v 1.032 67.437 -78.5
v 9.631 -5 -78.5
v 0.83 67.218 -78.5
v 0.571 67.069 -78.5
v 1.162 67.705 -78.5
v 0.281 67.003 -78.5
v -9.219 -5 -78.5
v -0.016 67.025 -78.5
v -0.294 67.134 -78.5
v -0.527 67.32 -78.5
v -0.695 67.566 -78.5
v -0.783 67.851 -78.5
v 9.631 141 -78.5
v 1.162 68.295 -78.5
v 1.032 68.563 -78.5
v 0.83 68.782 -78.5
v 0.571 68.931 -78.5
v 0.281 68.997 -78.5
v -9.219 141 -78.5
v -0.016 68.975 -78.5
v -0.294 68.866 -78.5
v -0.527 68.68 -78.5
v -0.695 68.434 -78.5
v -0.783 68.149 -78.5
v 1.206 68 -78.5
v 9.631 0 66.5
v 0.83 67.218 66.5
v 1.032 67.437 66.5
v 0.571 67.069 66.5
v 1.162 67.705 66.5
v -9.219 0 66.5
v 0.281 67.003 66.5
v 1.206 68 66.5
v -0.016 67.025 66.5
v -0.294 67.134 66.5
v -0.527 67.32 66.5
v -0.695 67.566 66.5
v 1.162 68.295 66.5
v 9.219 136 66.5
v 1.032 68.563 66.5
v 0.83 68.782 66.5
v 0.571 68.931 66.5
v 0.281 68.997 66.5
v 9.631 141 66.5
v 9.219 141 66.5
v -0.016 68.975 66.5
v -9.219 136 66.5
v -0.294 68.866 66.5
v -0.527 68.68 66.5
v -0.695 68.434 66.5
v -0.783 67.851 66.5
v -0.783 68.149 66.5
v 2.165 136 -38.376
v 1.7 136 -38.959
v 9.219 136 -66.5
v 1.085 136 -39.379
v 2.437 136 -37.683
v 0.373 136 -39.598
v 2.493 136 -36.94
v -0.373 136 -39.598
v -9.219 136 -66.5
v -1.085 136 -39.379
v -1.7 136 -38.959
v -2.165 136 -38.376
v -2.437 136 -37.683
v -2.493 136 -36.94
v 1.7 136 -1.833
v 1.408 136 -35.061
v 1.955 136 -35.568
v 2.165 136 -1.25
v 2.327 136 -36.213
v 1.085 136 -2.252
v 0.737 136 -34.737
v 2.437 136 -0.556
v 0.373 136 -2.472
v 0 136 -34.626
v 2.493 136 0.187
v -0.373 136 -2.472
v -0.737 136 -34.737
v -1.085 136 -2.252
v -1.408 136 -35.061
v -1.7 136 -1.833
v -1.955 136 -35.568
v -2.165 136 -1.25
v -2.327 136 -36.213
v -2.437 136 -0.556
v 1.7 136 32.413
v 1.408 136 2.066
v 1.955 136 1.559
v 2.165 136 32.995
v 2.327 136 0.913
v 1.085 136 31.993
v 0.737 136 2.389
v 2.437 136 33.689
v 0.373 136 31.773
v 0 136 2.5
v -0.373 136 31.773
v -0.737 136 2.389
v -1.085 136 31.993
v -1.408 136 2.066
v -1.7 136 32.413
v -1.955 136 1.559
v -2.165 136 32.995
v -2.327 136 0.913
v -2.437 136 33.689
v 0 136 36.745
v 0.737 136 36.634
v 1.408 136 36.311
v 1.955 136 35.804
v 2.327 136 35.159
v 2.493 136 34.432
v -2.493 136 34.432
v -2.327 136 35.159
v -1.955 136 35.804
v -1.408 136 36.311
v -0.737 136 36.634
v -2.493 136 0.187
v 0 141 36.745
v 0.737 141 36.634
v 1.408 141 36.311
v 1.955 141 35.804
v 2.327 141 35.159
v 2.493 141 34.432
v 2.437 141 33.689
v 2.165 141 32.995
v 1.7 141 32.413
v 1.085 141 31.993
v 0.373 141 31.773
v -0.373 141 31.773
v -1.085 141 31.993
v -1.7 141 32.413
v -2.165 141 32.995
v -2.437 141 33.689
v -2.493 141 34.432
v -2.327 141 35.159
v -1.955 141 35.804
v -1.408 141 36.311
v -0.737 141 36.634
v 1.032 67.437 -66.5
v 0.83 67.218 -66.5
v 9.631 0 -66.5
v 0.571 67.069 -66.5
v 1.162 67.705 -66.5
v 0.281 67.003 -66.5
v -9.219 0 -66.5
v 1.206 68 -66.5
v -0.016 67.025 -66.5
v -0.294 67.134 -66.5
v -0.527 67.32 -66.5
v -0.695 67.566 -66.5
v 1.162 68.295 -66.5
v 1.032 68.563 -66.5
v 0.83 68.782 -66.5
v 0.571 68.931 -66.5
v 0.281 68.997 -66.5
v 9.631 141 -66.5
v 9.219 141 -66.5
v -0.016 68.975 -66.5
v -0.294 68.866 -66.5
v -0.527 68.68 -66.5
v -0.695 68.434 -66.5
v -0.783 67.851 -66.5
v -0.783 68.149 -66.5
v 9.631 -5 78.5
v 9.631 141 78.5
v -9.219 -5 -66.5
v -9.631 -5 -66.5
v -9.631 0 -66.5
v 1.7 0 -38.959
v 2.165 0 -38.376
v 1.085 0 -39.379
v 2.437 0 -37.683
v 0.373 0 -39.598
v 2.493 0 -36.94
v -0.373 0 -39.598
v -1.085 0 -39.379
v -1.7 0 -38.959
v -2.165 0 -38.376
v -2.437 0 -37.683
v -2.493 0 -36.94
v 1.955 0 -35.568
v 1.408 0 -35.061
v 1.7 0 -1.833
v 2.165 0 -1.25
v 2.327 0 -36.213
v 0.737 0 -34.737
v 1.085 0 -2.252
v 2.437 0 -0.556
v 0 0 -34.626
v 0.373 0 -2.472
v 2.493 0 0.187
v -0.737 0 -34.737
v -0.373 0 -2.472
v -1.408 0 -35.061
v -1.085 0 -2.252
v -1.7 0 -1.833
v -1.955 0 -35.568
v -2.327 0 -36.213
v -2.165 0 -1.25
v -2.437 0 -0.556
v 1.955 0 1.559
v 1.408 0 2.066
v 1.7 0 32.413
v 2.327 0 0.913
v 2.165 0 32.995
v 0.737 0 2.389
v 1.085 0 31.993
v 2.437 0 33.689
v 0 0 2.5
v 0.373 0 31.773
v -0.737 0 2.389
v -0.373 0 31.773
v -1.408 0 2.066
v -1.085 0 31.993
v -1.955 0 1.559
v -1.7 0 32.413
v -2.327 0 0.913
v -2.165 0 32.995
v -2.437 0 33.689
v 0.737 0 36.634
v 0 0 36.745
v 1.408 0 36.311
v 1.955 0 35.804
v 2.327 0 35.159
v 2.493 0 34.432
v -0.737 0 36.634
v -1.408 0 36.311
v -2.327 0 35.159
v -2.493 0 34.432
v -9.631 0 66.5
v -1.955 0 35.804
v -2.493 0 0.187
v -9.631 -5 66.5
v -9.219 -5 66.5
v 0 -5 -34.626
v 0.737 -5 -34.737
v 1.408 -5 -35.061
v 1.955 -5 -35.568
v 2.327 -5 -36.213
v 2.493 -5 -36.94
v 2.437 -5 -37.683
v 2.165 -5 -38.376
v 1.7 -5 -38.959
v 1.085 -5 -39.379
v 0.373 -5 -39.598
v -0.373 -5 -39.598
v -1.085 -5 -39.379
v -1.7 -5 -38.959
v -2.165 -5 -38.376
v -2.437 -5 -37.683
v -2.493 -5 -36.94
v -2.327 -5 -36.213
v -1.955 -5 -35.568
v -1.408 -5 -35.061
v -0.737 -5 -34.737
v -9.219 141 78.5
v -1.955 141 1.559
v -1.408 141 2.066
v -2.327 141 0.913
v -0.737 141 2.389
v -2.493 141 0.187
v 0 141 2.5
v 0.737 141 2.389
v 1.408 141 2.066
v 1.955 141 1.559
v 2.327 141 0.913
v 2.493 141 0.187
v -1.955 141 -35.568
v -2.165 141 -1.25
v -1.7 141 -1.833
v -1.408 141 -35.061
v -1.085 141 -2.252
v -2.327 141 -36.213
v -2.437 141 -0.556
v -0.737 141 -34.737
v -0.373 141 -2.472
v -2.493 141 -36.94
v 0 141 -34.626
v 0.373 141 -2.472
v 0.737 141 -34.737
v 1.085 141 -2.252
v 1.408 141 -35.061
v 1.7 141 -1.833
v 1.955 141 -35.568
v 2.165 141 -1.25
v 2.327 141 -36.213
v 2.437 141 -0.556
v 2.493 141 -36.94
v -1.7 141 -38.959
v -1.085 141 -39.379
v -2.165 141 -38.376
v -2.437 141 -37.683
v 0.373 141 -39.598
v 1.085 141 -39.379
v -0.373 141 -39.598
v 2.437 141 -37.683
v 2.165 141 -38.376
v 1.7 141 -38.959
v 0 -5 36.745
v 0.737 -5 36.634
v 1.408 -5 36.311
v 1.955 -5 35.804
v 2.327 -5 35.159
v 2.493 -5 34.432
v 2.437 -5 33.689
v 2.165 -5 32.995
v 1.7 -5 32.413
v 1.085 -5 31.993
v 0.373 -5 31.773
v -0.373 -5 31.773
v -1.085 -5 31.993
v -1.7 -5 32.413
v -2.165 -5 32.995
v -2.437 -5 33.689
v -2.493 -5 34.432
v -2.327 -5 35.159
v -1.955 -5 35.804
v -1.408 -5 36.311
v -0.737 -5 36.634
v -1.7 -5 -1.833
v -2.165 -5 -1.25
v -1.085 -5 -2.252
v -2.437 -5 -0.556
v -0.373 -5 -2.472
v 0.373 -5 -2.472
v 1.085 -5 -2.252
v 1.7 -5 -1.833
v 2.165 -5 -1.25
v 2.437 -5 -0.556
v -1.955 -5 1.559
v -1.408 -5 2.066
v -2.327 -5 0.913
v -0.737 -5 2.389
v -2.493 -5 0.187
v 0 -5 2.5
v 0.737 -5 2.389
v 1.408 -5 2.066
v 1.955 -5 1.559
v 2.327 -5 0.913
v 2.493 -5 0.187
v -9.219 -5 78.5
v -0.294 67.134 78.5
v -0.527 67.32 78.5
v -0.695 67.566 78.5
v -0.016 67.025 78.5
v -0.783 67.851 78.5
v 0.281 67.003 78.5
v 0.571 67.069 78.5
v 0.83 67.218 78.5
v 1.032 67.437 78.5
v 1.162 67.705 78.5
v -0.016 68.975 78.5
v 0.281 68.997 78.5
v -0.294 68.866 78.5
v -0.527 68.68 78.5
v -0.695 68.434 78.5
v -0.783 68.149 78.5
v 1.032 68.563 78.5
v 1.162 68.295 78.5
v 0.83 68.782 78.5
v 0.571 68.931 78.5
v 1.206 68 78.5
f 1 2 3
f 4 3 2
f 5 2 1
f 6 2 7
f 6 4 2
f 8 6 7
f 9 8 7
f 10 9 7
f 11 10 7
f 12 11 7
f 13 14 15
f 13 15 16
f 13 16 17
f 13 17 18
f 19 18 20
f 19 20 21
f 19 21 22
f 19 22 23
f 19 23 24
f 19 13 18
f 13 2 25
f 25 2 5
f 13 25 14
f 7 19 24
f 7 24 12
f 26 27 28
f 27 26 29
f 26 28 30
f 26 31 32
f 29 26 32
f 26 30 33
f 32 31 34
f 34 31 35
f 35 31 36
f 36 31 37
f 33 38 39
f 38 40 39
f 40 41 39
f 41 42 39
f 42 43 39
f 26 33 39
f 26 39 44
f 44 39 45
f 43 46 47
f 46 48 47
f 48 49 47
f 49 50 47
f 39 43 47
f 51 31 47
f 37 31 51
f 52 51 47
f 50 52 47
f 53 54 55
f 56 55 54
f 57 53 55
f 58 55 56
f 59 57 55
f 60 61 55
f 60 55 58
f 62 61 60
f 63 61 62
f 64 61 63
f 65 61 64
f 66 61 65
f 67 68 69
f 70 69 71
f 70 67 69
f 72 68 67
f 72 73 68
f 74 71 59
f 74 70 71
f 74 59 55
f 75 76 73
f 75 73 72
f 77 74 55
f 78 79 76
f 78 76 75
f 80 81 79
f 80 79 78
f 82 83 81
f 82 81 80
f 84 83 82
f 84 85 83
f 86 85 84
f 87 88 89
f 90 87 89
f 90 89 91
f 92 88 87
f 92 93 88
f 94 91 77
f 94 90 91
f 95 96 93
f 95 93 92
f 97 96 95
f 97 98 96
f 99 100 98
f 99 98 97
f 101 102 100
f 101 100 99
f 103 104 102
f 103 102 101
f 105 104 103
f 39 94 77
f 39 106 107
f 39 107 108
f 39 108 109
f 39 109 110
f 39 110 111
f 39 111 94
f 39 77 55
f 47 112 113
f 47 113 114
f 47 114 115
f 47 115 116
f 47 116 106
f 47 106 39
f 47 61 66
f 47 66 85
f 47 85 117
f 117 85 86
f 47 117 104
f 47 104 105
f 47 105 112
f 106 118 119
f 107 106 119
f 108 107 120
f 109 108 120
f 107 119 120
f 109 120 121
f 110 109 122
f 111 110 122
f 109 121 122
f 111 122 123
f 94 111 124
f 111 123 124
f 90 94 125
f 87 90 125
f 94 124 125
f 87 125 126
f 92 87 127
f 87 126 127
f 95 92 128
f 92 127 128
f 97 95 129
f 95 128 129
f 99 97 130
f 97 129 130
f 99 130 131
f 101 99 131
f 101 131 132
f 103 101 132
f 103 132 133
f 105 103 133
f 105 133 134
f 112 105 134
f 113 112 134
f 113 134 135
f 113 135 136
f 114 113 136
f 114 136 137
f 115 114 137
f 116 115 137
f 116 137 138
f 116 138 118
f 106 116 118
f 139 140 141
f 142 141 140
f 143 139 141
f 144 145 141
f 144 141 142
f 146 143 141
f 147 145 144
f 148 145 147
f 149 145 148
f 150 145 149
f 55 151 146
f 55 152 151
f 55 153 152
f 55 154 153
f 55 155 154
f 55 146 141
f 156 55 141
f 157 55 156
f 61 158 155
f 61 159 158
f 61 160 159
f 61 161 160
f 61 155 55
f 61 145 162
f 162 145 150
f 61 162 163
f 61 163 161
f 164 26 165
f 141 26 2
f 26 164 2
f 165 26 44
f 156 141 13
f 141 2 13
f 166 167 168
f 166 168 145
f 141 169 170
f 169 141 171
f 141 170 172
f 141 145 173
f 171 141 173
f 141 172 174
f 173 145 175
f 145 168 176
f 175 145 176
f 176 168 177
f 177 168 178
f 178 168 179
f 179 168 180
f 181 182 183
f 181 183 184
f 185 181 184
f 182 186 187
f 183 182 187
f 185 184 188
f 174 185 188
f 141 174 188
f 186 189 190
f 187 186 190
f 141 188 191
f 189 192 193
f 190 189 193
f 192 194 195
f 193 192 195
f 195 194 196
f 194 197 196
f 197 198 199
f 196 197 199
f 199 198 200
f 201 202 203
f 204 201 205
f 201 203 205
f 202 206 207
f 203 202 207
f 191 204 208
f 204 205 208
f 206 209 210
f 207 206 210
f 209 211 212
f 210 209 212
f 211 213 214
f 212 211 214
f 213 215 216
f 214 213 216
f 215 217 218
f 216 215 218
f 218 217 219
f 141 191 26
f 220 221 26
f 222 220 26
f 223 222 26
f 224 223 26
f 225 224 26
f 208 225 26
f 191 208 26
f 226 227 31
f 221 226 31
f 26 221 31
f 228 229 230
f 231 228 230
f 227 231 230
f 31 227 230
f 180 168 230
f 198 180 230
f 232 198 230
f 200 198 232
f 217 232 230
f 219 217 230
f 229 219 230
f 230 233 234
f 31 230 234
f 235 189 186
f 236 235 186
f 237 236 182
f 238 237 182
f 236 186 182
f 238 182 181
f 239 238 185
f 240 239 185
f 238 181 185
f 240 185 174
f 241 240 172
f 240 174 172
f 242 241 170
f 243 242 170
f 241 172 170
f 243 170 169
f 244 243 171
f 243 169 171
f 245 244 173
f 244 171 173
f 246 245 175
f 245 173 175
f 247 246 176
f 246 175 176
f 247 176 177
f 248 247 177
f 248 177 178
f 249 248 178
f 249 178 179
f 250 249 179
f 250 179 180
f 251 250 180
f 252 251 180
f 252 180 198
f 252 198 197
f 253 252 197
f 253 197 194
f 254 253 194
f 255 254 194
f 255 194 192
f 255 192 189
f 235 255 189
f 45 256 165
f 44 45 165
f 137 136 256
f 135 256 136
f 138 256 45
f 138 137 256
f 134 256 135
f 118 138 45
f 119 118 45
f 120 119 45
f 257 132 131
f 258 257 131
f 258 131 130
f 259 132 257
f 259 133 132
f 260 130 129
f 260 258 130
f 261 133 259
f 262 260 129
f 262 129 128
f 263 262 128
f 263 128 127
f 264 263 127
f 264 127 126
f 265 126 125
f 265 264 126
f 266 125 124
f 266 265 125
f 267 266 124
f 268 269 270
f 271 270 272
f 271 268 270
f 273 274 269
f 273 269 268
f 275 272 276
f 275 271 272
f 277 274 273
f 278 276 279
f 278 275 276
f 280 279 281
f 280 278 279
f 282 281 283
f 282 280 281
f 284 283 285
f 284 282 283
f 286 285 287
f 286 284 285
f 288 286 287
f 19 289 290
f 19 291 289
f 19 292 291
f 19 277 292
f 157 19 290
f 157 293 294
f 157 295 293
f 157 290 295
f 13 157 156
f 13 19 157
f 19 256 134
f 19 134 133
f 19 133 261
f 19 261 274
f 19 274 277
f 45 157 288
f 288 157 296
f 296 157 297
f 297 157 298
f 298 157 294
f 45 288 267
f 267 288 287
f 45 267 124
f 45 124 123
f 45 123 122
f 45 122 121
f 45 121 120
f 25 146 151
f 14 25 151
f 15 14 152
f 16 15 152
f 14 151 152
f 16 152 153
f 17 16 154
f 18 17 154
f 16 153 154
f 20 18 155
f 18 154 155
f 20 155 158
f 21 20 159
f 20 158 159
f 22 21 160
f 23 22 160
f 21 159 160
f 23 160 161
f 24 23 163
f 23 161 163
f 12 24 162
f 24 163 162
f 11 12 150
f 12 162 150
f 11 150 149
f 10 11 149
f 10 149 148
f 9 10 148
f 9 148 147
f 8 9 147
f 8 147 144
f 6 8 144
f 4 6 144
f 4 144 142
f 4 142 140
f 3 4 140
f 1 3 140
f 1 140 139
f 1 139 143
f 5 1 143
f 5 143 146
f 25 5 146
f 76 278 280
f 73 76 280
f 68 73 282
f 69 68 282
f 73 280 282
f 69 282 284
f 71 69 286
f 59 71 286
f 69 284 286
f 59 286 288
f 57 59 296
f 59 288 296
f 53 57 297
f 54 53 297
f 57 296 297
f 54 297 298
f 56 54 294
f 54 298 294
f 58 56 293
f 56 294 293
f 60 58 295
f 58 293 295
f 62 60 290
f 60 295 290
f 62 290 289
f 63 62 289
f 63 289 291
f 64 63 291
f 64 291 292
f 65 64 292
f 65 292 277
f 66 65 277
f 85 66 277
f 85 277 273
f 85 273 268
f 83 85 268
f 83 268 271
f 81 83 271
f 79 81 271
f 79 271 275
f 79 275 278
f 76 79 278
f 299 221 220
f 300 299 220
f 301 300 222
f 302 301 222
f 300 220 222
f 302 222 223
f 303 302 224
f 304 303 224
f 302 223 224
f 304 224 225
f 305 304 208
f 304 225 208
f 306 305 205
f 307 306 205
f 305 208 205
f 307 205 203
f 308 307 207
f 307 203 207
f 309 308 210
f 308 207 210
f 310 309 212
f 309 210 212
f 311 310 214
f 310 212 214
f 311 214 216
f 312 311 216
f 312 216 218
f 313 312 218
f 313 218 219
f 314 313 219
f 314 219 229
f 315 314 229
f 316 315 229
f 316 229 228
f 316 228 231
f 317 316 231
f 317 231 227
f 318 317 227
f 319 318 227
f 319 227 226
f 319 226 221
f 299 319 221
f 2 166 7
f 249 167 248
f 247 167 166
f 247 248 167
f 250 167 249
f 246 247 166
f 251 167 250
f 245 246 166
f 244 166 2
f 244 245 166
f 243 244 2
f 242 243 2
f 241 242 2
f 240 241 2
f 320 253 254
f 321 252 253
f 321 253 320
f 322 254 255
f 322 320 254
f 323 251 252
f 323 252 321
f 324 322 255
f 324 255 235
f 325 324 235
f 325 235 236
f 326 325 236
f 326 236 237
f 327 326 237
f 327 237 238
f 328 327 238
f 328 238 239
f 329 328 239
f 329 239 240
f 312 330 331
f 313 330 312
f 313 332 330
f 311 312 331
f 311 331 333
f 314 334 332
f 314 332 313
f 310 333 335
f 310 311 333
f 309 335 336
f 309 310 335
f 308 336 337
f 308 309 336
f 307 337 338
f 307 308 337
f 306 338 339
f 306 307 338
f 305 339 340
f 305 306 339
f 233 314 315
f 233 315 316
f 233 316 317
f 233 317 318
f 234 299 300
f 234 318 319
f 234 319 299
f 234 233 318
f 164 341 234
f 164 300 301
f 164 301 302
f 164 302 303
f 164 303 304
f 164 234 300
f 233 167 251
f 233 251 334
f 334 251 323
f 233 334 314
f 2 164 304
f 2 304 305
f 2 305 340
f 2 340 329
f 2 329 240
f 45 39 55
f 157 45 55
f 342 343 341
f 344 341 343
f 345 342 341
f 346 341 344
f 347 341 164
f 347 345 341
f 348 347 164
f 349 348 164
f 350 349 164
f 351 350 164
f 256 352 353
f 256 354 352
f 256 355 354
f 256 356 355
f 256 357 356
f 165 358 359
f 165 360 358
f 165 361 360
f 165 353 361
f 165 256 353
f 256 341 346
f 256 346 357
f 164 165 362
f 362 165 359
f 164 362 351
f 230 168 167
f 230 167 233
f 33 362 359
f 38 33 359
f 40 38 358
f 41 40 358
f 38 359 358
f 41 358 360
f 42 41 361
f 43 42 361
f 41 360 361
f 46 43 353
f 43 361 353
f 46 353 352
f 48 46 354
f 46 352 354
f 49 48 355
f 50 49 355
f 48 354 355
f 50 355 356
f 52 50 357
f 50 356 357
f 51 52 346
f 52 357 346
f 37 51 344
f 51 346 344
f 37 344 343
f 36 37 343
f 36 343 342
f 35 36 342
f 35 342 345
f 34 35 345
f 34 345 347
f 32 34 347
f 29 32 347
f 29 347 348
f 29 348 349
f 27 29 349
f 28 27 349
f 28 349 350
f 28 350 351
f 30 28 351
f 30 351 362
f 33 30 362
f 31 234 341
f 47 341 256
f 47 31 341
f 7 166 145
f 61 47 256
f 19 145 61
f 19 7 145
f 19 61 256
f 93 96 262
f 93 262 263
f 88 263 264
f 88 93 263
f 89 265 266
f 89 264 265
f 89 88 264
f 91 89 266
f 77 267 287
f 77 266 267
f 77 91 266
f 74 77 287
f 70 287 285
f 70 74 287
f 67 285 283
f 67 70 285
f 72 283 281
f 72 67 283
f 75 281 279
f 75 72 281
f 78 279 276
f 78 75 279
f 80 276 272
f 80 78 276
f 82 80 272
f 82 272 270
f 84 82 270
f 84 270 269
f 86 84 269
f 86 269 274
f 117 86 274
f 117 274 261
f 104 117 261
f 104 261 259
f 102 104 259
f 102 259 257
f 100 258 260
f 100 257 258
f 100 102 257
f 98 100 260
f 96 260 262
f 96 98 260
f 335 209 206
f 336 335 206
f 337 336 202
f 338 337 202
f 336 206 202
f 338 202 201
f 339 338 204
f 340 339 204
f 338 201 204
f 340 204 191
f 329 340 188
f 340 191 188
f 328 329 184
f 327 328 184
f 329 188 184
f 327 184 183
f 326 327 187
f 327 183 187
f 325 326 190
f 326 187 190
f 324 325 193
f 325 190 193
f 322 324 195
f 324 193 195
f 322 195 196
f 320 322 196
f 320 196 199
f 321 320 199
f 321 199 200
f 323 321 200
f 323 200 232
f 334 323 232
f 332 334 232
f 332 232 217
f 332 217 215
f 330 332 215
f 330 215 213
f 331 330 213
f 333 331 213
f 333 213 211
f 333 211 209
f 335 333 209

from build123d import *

# Parameters (mm, degrees)
SKETCH1_W            = 133
SKETCH1_H            = 133
BOSS_EXTRUDE2_DEPTH  = 136
SKETCH2_W            = 133
SKETCH2_H            = 118
CUT_EXTRUDE1_DEPTH   = 136
BOSS_EXTRUDE3_DEPTH  = 10.5
SKETCH5_W            = 21
SKETCH5_H            = 3
BOSS_EXTRUDE4_DEPTH  = 23.5
SKETCH6_W            = 42
SKETCH6_H            = 17.2
CUT_EXTRUDE2_DEPTH   = 3
BOSS_EXTRUDE5_DEPTH  = 10.5
SKETCH8_W            = 21
SKETCH8_H            = 3
BOSS_EXTRUDE6_DEPTH  = 23.5
SKETCH9_W            = 42
SKETCH9_H            = 17.2
CUT_EXTRUDE3_DEPTH   = 3
SKETCH10_W           = 19.261488562
SKETCH10_H           = 133
BOSS_EXTRUDE7_DEPTH  = 5
SKETCH11_W           = 18.43727499
SKETCH11_H           = 133
BOSS_EXTRUDE8_DEPTH  = 5
SKETCH12_W           = 18.849381776
SKETCH12_H           = 146
BOSS_EXTRUDE9_DEPTH  = 12
SKETCH14_W           = 18.849381776
SKETCH14_H           = 146
BOSS_EXTRUDE10_DEPTH = 12
SKETCH17_R           = 1
CUT_EXTRUDE4_DEPTH   = 222.251553667
SKETCH18_W           = 133
SKETCH18_H           = 136
CUT_EXTRUDE5_DEPTH   = 170
SKETCH20_R           = 2.5
CUT_EXTRUDE6_DEPTH   = 10
SKETCH22_R           = 2.5
CUT_EXTRUDE8_DEPTH   = 170
SKETCH24_R           = 2.5
CUT_EXTRUDE9_DEPTH   = 170
SKETCH26_R           = 2.474722671
CUT_EXTRUDE10_DEPTH  = 177
SKETCH27_R           = 2.5
CUT_EXTRUDE11_DEPTH  = 177
SKETCH29_R           = 2.5
CUT_EXTRUDE12_DEPTH  = 177
SKETCH30_R           = 2.5
CUT_EXTRUDE13_DEPTH  = 178
SKETCH31_R           = 2.5
CUT_EXTRUDE14_DEPTH  = 178
SKETCH32_R           = 2.474722671
SKETCH32_R_2         = 2.5
BOSS_EXTRUDE11_DEPTH = 5
SKETCH33_R           = 2.5
BOSS_EXTRUDE12_DEPTH = 5


with BuildPart() as part:
    # Sketch1 → Boss-Extrude2 (new body)
    with BuildSketch(Plane(origin=(0, 0, 0), x_dir=(1, 0, 0), z_dir=(0, 1, 0))):
        Rectangle(SKETCH1_W, SKETCH1_H)
    extrude(amount=BOSS_EXTRUDE2_DEPTH)

    # Sketch2 → Cut-Extrude1 (cut)
    with BuildSketch(Plane.XY.offset(66.5)):
        with Locations((0, 68)):
            Rectangle(SKETCH2_W, SKETCH2_H)
    extrude(amount=-CUT_EXTRUDE1_DEPTH, mode=Mode.SUBTRACT)


with BuildPart() as cut_extrude1_piece_1:
    # of the separate pieces the step leaves, piece 1, a body of its own (cut_extrude1_pieces)
    add(part.part.solids().sort_by_distance((-66.5, 0, 66.5))[0])

    # Sketch4 → Boss-Extrude3 (add)
    with BuildSketch(Plane(origin=(0, 9, 0), x_dir=(1, 0, 0), z_dir=(0, 1, 0))):
        Polygon((22.75, -22.75), (43.75, -22.75), (46.25, -22.75), (46.25, -20.25), (20.25, -20.25), (20.25, -46.25), (46.25, -46.25), (46.25, -43.75), (43.75, -43.75), (22.75, -43.75), align=None)
        Polygon((22.75, 43.75), (43.75, 43.75), (46.25, 43.75), (46.25, 46.25), (20.25, 46.25), (20.25, 20.25), (46.25, 20.25), (46.25, 22.75), (43.75, 22.75), (22.75, 22.75), align=None)
    extrude(amount=BOSS_EXTRUDE3_DEPTH)

    # Sketch5 → Boss-Extrude4 (add)
    with BuildSketch(Plane(origin=(22.75, 0, 0), x_dir=(0, 0, -1), z_dir=(1, 0, 0))):
        with Locations((-33.25, 18)):
            Rectangle(SKETCH5_W, SKETCH5_H)
        with Locations((33.25, 18)):
            Rectangle(SKETCH5_W, SKETCH5_H)
    extrude(amount=BOSS_EXTRUDE4_DEPTH)

    # Sketch6 → Cut-Extrude2 (cut)
    with BuildSketch(Plane(origin=(0, 19.5, 0), x_dir=(1, 0, 0), z_dir=(0, 1, 0))):
        with Locations((46.25, -33.25)):
            Rectangle(SKETCH6_W, SKETCH6_H)
        with Locations((46.25, 33.25)):
            Rectangle(SKETCH6_W, SKETCH6_H)
    extrude(amount=-CUT_EXTRUDE2_DEPTH, mode=Mode.SUBTRACT)

    # Sketch10 → Boss-Extrude7 (add)
    with BuildSketch(Plane.XZ):
        Rectangle(SKETCH10_W, SKETCH10_H)
    extrude(amount=BOSS_EXTRUDE7_DEPTH)



with BuildPart() as cut_extrude1_piece_2:
    # of the separate pieces the step leaves, piece 2, a body of its own (cut_extrude1_pieces)
    add(part.part.solids().sort_by_distance((66.5, 127, 66.5))[0])

    # Sketch7 → Boss-Extrude5 (add)
    with BuildSketch(Plane.XZ.offset(-127)):
        Polygon((-43.75, 43.75), (-22.75, 43.75), (-22.75, 22.75), (-43.75, 22.75), (-46.25, 22.75), (-46.25, 20.25), (-20.25, 20.25), (-20.25, 46.25), (-46.25, 46.25), (-46.25, 43.75), align=None)
        Polygon((-43.75, -22.75), (-22.75, -22.75), (-22.75, -43.75), (-43.75, -43.75), (-46.25, -43.75), (-46.25, -46.25), (-20.25, -46.25), (-20.25, -20.25), (-46.25, -20.25), (-46.25, -22.75), align=None)
    extrude(amount=BOSS_EXTRUDE5_DEPTH)

    # Sketch8 → Boss-Extrude6 (add)
    with BuildSketch(Plane.ZY.offset(22.75)):
        with Locations((33.25, 118)):
            Rectangle(SKETCH8_W, SKETCH8_H)
        with Locations((-33.25, 118)):
            Rectangle(SKETCH8_W, SKETCH8_H)
    extrude(amount=BOSS_EXTRUDE6_DEPTH)

    # Sketch9 → Cut-Extrude3 (cut)
    with BuildSketch(Plane.XZ.offset(-116.5)):
        with Locations((-46.25, 33.25)):
            Rectangle(SKETCH9_W, SKETCH9_H)
        with Locations((-46.25, -33.25)):
            Rectangle(SKETCH9_W, SKETCH9_H)
    extrude(amount=-CUT_EXTRUDE3_DEPTH, mode=Mode.SUBTRACT)

    # Sketch11 → Boss-Extrude8 (add)
    with BuildSketch(Plane(origin=(0, 136, 0), x_dir=(1, 0, 0), z_dir=(0, 1, 0))):
        Rectangle(SKETCH11_W, SKETCH11_H)
    extrude(amount=BOSS_EXTRUDE8_DEPTH)


with BuildPart() as cut_extrude1_piece_1_1:
    add(cut_extrude1_piece_1.part)

    add(cut_extrude1_piece_2.part)  # Boss-Extrude9 merges Cut-Extrude1 piece 2
    # Sketch12 → Boss-Extrude9 (add)
    with BuildSketch(Plane(origin=(0, 0, -66.5), x_dir=(-1, 0, 0), z_dir=(0, 0, -1))):
        with Locations((-0.206053393, 68)):
            Rectangle(SKETCH12_W, SKETCH12_H)
    extrude(amount=BOSS_EXTRUDE9_DEPTH)

    # Sketch14 → Boss-Extrude10 (add)
    with BuildSketch(Plane.XY.offset(66.5)):
        with Locations((0.206053393, 68)):
            Rectangle(SKETCH14_W, SKETCH14_H)
    extrude(amount=BOSS_EXTRUDE10_DEPTH)

    # Sketch17 → Cut-Extrude4 (cut, through all)
    with BuildSketch(Plane.XY.offset(78.5)):
        with Locations((0.206053393, 68)):
            Circle(SKETCH17_R)
    extrude(amount=-CUT_EXTRUDE4_DEPTH, mode=Mode.SUBTRACT)

    # Sketch18 → Cut-Extrude5 (cut)
    with BuildSketch(Plane.ZY.offset(66.5)):
        with Locations((0, 68)):
            Rectangle(SKETCH18_W, SKETCH18_H)
    extrude(amount=-CUT_EXTRUDE5_DEPTH, mode=Mode.SUBTRACT)

    # Sketch20 → Cut-Extrude6 (cut)
    with BuildSketch(Plane(origin=(0, 0, 0), x_dir=(1, 0, 0), z_dir=(0, 1, 0))):
        with Locations(Location((0, 0, 0), (0, 0, 270))):
            Circle(SKETCH20_R)
    extrude(amount=-CUT_EXTRUDE6_DEPTH, mode=Mode.SUBTRACT)

    # Sketch22 → Cut-Extrude8 (cut)
    with BuildSketch(Plane(origin=(0, 0, 0), x_dir=(1, 0, 0), z_dir=(0, 1, 0))):
        with Locations(Location((0, 0, 0), (0, 0, 270))):
            Circle(SKETCH22_R)
    extrude(amount=CUT_EXTRUDE8_DEPTH, mode=Mode.SUBTRACT)

    # Sketch24 → Cut-Extrude9 (cut)
    with BuildSketch(Plane(origin=(0, 0, 0), x_dir=(1, 0, 0), z_dir=(0, 1, 0))):
        with Locations(Location((0, 59.159797643, 0), (0, 0, 270))):
            Circle(SKETCH24_R)
    extrude(amount=-CUT_EXTRUDE9_DEPTH, mode=Mode.SUBTRACT)

    # Sketch26 → Cut-Extrude10 (cut)
    with BuildSketch(Plane(origin=(0, 9, 0), x_dir=(1, 0, 0), z_dir=(0, 1, 0))):
        with Locations(Location((0, 59.159797643, 0), (0, 0, 90))):
            Circle(SKETCH26_R)
    extrude(amount=CUT_EXTRUDE10_DEPTH, mode=Mode.SUBTRACT)

    # Sketch27 → Cut-Extrude11 (cut)
    with BuildSketch(Plane(origin=(0, 0, 0), x_dir=(1, 0, 0), z_dir=(0, 1, 0))):
        with Locations(Location((0, -59.499471122, 0), (0, 0, 270))):
            Circle(SKETCH27_R)
    extrude(amount=-CUT_EXTRUDE11_DEPTH, mode=Mode.SUBTRACT)

    # Sketch29 → Cut-Extrude12 (cut)
    with BuildSketch(Plane.XZ.offset(5)):
        with Locations(Location((0, 59.499471122, 0), (0, 0, 90))):
            Circle(SKETCH29_R)
    extrude(amount=-CUT_EXTRUDE12_DEPTH, mode=Mode.SUBTRACT)

    # Sketch30 → Cut-Extrude13 (cut)
    with BuildSketch(Plane(origin=(0, 141, 0), x_dir=(1, 0, 0), z_dir=(0, 1, 0))):
        with Locations(Location((0, 37.126366322, 0), (0, 0, 270))):
            Circle(SKETCH30_R)
    extrude(amount=-CUT_EXTRUDE13_DEPTH, mode=Mode.SUBTRACT)

    # Sketch31 → Cut-Extrude14 (cut)
    with BuildSketch(Plane(origin=(0, 141, 0), x_dir=(1, 0, 0), z_dir=(0, 1, 0))):
        with Locations(Location((0, -34.245307912, 0), (0, 0, 270))):
            Circle(SKETCH31_R)
    extrude(amount=-CUT_EXTRUDE14_DEPTH, mode=Mode.SUBTRACT)

    # Sketch32 → Boss-Extrude11 (add)
    with BuildSketch(Plane(origin=(0, 141, 0), x_dir=(1, 0, 0), z_dir=(0, 1, 0))):
        with Locations((0, 59.159797643)):
            Circle(SKETCH32_R)
        with Locations(Location((0, -59.499471122, 0), (0, 0, 270))):
            Circle(SKETCH32_R_2)
    extrude(amount=-BOSS_EXTRUDE11_DEPTH)

    # Sketch33 → Boss-Extrude12 (add)
    with BuildSketch(Plane.XZ.offset(5)):
        with Locations((0, -59.159797643)):
            Circle(SKETCH33_R)
        with Locations((0, 59.499471122)):
            Circle(SKETCH33_R)
    extrude(amount=-BOSS_EXTRUDE12_DEPTH)


solid = cut_extrude1_piece_1_1.part
